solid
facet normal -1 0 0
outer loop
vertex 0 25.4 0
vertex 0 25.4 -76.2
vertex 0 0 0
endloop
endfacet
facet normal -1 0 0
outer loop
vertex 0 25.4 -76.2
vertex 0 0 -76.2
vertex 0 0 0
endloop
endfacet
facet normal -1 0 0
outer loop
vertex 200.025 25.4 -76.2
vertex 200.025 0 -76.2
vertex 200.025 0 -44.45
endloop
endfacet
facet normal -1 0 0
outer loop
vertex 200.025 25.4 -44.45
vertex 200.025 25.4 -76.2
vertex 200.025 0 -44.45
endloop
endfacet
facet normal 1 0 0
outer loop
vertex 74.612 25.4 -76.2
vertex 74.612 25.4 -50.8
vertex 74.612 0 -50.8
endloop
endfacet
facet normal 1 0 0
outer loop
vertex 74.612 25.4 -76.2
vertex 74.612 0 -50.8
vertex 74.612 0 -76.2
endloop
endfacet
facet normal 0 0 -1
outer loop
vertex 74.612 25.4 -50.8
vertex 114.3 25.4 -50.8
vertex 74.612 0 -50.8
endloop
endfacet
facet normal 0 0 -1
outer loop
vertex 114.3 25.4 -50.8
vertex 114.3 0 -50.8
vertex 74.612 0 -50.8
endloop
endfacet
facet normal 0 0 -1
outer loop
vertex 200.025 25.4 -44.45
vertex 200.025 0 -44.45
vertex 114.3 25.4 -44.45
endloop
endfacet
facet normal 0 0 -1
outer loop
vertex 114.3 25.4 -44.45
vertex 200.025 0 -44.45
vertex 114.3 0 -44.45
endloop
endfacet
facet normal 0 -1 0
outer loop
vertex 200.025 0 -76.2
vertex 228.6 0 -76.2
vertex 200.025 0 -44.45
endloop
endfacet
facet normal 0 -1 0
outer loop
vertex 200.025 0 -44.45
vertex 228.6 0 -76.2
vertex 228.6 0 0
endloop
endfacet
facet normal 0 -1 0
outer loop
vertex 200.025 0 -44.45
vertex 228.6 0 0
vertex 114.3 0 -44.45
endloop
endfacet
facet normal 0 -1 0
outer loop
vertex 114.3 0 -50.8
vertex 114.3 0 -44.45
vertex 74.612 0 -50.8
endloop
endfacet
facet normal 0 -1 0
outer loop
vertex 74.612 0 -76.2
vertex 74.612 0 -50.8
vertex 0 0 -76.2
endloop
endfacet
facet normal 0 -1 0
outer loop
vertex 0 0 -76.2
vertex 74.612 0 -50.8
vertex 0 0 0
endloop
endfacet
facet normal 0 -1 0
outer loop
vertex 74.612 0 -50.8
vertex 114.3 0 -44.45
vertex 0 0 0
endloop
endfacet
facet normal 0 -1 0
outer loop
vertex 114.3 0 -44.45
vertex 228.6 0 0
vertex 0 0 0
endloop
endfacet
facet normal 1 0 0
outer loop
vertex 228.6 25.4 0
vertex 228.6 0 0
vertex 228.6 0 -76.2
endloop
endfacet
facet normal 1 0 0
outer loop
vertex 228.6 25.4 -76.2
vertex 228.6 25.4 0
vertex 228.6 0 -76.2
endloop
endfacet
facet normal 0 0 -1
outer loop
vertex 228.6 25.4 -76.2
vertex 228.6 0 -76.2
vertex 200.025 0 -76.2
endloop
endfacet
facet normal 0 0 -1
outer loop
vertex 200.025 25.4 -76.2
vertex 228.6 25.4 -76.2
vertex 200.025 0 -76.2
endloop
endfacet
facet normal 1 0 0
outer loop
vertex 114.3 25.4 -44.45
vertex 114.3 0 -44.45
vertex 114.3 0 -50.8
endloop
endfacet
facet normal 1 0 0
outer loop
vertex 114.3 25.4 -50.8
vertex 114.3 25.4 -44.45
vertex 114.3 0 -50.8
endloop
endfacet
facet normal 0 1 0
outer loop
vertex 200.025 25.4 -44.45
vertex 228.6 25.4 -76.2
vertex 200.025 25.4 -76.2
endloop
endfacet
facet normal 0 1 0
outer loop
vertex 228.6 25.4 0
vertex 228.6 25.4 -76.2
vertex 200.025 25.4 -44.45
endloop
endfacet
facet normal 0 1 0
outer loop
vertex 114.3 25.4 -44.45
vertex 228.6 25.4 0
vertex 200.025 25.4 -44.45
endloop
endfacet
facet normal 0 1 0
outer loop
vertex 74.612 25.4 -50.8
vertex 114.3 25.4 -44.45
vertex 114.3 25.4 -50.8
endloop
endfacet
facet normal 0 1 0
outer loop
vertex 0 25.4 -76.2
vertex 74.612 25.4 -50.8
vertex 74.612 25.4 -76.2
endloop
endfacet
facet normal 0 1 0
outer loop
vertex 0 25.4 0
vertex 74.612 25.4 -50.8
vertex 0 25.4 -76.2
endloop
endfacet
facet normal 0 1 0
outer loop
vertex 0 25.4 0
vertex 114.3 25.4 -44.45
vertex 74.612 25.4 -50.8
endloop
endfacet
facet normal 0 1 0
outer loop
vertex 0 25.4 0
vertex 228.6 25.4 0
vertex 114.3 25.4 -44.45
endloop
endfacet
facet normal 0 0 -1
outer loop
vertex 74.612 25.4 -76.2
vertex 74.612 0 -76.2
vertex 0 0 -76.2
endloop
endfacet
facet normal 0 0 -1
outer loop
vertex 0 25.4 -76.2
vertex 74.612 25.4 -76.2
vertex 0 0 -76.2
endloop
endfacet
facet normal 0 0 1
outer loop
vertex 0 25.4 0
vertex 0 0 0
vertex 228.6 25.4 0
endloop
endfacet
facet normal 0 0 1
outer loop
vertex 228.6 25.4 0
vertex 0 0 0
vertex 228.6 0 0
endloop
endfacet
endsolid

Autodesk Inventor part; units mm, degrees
ref_plane "YZ Plane" through (0, 0, 0) normal (1, 0, 0) x (0, 1, 0)
ref_plane "XZ Plane" through (0, 0, 0) normal (0, 1, 0) x (-1, 0, 0)
ref_plane "XY Plane" through (0, 0, 0) normal (0, 0, 1) x (1, 0, 0)
sketch "Sketch1" plane through (0, 0, 0) normal (0, 1, 0) x (-1, 0, 0)
  line L0 (0, 0) -> (-228.6, 0)
  line L1 (-228.6, 0) -> (-228.6, -76.2)
  line L2 (-228.6, -76.2) -> (-200.025, -76.2)
  line L3 (-200.025, -76.2) -> (-200.025, -44.45)
  line L4 (-200.025, -44.45) -> (-114.3, -44.45)
  line L5 (-114.3, -44.45) -> (-114.3, -50.8)
  line L6 (-114.3, -50.8) -> (-74.6125, -50.8)
  line L7 (-74.6125, -50.8) -> (-74.6125, -76.2)
  line L8 (-74.6125, -76.2) -> (0, -76.2)
  line L9 (0, -76.2) -> (0, 0)
  dimension "d0" = 228.6
  dimension "d2" = 76.2
  dimension "d3" = 28.575
  dimension "d4" = 31.75
  dimension "d5" = 85.725
  dimension "d6" = 6.35
  dimension "d7" = 39.6875
extrude "Extrusion1" add sketch "Sketch1" along normal blind 25.4
properties part number "StairTemplate"
